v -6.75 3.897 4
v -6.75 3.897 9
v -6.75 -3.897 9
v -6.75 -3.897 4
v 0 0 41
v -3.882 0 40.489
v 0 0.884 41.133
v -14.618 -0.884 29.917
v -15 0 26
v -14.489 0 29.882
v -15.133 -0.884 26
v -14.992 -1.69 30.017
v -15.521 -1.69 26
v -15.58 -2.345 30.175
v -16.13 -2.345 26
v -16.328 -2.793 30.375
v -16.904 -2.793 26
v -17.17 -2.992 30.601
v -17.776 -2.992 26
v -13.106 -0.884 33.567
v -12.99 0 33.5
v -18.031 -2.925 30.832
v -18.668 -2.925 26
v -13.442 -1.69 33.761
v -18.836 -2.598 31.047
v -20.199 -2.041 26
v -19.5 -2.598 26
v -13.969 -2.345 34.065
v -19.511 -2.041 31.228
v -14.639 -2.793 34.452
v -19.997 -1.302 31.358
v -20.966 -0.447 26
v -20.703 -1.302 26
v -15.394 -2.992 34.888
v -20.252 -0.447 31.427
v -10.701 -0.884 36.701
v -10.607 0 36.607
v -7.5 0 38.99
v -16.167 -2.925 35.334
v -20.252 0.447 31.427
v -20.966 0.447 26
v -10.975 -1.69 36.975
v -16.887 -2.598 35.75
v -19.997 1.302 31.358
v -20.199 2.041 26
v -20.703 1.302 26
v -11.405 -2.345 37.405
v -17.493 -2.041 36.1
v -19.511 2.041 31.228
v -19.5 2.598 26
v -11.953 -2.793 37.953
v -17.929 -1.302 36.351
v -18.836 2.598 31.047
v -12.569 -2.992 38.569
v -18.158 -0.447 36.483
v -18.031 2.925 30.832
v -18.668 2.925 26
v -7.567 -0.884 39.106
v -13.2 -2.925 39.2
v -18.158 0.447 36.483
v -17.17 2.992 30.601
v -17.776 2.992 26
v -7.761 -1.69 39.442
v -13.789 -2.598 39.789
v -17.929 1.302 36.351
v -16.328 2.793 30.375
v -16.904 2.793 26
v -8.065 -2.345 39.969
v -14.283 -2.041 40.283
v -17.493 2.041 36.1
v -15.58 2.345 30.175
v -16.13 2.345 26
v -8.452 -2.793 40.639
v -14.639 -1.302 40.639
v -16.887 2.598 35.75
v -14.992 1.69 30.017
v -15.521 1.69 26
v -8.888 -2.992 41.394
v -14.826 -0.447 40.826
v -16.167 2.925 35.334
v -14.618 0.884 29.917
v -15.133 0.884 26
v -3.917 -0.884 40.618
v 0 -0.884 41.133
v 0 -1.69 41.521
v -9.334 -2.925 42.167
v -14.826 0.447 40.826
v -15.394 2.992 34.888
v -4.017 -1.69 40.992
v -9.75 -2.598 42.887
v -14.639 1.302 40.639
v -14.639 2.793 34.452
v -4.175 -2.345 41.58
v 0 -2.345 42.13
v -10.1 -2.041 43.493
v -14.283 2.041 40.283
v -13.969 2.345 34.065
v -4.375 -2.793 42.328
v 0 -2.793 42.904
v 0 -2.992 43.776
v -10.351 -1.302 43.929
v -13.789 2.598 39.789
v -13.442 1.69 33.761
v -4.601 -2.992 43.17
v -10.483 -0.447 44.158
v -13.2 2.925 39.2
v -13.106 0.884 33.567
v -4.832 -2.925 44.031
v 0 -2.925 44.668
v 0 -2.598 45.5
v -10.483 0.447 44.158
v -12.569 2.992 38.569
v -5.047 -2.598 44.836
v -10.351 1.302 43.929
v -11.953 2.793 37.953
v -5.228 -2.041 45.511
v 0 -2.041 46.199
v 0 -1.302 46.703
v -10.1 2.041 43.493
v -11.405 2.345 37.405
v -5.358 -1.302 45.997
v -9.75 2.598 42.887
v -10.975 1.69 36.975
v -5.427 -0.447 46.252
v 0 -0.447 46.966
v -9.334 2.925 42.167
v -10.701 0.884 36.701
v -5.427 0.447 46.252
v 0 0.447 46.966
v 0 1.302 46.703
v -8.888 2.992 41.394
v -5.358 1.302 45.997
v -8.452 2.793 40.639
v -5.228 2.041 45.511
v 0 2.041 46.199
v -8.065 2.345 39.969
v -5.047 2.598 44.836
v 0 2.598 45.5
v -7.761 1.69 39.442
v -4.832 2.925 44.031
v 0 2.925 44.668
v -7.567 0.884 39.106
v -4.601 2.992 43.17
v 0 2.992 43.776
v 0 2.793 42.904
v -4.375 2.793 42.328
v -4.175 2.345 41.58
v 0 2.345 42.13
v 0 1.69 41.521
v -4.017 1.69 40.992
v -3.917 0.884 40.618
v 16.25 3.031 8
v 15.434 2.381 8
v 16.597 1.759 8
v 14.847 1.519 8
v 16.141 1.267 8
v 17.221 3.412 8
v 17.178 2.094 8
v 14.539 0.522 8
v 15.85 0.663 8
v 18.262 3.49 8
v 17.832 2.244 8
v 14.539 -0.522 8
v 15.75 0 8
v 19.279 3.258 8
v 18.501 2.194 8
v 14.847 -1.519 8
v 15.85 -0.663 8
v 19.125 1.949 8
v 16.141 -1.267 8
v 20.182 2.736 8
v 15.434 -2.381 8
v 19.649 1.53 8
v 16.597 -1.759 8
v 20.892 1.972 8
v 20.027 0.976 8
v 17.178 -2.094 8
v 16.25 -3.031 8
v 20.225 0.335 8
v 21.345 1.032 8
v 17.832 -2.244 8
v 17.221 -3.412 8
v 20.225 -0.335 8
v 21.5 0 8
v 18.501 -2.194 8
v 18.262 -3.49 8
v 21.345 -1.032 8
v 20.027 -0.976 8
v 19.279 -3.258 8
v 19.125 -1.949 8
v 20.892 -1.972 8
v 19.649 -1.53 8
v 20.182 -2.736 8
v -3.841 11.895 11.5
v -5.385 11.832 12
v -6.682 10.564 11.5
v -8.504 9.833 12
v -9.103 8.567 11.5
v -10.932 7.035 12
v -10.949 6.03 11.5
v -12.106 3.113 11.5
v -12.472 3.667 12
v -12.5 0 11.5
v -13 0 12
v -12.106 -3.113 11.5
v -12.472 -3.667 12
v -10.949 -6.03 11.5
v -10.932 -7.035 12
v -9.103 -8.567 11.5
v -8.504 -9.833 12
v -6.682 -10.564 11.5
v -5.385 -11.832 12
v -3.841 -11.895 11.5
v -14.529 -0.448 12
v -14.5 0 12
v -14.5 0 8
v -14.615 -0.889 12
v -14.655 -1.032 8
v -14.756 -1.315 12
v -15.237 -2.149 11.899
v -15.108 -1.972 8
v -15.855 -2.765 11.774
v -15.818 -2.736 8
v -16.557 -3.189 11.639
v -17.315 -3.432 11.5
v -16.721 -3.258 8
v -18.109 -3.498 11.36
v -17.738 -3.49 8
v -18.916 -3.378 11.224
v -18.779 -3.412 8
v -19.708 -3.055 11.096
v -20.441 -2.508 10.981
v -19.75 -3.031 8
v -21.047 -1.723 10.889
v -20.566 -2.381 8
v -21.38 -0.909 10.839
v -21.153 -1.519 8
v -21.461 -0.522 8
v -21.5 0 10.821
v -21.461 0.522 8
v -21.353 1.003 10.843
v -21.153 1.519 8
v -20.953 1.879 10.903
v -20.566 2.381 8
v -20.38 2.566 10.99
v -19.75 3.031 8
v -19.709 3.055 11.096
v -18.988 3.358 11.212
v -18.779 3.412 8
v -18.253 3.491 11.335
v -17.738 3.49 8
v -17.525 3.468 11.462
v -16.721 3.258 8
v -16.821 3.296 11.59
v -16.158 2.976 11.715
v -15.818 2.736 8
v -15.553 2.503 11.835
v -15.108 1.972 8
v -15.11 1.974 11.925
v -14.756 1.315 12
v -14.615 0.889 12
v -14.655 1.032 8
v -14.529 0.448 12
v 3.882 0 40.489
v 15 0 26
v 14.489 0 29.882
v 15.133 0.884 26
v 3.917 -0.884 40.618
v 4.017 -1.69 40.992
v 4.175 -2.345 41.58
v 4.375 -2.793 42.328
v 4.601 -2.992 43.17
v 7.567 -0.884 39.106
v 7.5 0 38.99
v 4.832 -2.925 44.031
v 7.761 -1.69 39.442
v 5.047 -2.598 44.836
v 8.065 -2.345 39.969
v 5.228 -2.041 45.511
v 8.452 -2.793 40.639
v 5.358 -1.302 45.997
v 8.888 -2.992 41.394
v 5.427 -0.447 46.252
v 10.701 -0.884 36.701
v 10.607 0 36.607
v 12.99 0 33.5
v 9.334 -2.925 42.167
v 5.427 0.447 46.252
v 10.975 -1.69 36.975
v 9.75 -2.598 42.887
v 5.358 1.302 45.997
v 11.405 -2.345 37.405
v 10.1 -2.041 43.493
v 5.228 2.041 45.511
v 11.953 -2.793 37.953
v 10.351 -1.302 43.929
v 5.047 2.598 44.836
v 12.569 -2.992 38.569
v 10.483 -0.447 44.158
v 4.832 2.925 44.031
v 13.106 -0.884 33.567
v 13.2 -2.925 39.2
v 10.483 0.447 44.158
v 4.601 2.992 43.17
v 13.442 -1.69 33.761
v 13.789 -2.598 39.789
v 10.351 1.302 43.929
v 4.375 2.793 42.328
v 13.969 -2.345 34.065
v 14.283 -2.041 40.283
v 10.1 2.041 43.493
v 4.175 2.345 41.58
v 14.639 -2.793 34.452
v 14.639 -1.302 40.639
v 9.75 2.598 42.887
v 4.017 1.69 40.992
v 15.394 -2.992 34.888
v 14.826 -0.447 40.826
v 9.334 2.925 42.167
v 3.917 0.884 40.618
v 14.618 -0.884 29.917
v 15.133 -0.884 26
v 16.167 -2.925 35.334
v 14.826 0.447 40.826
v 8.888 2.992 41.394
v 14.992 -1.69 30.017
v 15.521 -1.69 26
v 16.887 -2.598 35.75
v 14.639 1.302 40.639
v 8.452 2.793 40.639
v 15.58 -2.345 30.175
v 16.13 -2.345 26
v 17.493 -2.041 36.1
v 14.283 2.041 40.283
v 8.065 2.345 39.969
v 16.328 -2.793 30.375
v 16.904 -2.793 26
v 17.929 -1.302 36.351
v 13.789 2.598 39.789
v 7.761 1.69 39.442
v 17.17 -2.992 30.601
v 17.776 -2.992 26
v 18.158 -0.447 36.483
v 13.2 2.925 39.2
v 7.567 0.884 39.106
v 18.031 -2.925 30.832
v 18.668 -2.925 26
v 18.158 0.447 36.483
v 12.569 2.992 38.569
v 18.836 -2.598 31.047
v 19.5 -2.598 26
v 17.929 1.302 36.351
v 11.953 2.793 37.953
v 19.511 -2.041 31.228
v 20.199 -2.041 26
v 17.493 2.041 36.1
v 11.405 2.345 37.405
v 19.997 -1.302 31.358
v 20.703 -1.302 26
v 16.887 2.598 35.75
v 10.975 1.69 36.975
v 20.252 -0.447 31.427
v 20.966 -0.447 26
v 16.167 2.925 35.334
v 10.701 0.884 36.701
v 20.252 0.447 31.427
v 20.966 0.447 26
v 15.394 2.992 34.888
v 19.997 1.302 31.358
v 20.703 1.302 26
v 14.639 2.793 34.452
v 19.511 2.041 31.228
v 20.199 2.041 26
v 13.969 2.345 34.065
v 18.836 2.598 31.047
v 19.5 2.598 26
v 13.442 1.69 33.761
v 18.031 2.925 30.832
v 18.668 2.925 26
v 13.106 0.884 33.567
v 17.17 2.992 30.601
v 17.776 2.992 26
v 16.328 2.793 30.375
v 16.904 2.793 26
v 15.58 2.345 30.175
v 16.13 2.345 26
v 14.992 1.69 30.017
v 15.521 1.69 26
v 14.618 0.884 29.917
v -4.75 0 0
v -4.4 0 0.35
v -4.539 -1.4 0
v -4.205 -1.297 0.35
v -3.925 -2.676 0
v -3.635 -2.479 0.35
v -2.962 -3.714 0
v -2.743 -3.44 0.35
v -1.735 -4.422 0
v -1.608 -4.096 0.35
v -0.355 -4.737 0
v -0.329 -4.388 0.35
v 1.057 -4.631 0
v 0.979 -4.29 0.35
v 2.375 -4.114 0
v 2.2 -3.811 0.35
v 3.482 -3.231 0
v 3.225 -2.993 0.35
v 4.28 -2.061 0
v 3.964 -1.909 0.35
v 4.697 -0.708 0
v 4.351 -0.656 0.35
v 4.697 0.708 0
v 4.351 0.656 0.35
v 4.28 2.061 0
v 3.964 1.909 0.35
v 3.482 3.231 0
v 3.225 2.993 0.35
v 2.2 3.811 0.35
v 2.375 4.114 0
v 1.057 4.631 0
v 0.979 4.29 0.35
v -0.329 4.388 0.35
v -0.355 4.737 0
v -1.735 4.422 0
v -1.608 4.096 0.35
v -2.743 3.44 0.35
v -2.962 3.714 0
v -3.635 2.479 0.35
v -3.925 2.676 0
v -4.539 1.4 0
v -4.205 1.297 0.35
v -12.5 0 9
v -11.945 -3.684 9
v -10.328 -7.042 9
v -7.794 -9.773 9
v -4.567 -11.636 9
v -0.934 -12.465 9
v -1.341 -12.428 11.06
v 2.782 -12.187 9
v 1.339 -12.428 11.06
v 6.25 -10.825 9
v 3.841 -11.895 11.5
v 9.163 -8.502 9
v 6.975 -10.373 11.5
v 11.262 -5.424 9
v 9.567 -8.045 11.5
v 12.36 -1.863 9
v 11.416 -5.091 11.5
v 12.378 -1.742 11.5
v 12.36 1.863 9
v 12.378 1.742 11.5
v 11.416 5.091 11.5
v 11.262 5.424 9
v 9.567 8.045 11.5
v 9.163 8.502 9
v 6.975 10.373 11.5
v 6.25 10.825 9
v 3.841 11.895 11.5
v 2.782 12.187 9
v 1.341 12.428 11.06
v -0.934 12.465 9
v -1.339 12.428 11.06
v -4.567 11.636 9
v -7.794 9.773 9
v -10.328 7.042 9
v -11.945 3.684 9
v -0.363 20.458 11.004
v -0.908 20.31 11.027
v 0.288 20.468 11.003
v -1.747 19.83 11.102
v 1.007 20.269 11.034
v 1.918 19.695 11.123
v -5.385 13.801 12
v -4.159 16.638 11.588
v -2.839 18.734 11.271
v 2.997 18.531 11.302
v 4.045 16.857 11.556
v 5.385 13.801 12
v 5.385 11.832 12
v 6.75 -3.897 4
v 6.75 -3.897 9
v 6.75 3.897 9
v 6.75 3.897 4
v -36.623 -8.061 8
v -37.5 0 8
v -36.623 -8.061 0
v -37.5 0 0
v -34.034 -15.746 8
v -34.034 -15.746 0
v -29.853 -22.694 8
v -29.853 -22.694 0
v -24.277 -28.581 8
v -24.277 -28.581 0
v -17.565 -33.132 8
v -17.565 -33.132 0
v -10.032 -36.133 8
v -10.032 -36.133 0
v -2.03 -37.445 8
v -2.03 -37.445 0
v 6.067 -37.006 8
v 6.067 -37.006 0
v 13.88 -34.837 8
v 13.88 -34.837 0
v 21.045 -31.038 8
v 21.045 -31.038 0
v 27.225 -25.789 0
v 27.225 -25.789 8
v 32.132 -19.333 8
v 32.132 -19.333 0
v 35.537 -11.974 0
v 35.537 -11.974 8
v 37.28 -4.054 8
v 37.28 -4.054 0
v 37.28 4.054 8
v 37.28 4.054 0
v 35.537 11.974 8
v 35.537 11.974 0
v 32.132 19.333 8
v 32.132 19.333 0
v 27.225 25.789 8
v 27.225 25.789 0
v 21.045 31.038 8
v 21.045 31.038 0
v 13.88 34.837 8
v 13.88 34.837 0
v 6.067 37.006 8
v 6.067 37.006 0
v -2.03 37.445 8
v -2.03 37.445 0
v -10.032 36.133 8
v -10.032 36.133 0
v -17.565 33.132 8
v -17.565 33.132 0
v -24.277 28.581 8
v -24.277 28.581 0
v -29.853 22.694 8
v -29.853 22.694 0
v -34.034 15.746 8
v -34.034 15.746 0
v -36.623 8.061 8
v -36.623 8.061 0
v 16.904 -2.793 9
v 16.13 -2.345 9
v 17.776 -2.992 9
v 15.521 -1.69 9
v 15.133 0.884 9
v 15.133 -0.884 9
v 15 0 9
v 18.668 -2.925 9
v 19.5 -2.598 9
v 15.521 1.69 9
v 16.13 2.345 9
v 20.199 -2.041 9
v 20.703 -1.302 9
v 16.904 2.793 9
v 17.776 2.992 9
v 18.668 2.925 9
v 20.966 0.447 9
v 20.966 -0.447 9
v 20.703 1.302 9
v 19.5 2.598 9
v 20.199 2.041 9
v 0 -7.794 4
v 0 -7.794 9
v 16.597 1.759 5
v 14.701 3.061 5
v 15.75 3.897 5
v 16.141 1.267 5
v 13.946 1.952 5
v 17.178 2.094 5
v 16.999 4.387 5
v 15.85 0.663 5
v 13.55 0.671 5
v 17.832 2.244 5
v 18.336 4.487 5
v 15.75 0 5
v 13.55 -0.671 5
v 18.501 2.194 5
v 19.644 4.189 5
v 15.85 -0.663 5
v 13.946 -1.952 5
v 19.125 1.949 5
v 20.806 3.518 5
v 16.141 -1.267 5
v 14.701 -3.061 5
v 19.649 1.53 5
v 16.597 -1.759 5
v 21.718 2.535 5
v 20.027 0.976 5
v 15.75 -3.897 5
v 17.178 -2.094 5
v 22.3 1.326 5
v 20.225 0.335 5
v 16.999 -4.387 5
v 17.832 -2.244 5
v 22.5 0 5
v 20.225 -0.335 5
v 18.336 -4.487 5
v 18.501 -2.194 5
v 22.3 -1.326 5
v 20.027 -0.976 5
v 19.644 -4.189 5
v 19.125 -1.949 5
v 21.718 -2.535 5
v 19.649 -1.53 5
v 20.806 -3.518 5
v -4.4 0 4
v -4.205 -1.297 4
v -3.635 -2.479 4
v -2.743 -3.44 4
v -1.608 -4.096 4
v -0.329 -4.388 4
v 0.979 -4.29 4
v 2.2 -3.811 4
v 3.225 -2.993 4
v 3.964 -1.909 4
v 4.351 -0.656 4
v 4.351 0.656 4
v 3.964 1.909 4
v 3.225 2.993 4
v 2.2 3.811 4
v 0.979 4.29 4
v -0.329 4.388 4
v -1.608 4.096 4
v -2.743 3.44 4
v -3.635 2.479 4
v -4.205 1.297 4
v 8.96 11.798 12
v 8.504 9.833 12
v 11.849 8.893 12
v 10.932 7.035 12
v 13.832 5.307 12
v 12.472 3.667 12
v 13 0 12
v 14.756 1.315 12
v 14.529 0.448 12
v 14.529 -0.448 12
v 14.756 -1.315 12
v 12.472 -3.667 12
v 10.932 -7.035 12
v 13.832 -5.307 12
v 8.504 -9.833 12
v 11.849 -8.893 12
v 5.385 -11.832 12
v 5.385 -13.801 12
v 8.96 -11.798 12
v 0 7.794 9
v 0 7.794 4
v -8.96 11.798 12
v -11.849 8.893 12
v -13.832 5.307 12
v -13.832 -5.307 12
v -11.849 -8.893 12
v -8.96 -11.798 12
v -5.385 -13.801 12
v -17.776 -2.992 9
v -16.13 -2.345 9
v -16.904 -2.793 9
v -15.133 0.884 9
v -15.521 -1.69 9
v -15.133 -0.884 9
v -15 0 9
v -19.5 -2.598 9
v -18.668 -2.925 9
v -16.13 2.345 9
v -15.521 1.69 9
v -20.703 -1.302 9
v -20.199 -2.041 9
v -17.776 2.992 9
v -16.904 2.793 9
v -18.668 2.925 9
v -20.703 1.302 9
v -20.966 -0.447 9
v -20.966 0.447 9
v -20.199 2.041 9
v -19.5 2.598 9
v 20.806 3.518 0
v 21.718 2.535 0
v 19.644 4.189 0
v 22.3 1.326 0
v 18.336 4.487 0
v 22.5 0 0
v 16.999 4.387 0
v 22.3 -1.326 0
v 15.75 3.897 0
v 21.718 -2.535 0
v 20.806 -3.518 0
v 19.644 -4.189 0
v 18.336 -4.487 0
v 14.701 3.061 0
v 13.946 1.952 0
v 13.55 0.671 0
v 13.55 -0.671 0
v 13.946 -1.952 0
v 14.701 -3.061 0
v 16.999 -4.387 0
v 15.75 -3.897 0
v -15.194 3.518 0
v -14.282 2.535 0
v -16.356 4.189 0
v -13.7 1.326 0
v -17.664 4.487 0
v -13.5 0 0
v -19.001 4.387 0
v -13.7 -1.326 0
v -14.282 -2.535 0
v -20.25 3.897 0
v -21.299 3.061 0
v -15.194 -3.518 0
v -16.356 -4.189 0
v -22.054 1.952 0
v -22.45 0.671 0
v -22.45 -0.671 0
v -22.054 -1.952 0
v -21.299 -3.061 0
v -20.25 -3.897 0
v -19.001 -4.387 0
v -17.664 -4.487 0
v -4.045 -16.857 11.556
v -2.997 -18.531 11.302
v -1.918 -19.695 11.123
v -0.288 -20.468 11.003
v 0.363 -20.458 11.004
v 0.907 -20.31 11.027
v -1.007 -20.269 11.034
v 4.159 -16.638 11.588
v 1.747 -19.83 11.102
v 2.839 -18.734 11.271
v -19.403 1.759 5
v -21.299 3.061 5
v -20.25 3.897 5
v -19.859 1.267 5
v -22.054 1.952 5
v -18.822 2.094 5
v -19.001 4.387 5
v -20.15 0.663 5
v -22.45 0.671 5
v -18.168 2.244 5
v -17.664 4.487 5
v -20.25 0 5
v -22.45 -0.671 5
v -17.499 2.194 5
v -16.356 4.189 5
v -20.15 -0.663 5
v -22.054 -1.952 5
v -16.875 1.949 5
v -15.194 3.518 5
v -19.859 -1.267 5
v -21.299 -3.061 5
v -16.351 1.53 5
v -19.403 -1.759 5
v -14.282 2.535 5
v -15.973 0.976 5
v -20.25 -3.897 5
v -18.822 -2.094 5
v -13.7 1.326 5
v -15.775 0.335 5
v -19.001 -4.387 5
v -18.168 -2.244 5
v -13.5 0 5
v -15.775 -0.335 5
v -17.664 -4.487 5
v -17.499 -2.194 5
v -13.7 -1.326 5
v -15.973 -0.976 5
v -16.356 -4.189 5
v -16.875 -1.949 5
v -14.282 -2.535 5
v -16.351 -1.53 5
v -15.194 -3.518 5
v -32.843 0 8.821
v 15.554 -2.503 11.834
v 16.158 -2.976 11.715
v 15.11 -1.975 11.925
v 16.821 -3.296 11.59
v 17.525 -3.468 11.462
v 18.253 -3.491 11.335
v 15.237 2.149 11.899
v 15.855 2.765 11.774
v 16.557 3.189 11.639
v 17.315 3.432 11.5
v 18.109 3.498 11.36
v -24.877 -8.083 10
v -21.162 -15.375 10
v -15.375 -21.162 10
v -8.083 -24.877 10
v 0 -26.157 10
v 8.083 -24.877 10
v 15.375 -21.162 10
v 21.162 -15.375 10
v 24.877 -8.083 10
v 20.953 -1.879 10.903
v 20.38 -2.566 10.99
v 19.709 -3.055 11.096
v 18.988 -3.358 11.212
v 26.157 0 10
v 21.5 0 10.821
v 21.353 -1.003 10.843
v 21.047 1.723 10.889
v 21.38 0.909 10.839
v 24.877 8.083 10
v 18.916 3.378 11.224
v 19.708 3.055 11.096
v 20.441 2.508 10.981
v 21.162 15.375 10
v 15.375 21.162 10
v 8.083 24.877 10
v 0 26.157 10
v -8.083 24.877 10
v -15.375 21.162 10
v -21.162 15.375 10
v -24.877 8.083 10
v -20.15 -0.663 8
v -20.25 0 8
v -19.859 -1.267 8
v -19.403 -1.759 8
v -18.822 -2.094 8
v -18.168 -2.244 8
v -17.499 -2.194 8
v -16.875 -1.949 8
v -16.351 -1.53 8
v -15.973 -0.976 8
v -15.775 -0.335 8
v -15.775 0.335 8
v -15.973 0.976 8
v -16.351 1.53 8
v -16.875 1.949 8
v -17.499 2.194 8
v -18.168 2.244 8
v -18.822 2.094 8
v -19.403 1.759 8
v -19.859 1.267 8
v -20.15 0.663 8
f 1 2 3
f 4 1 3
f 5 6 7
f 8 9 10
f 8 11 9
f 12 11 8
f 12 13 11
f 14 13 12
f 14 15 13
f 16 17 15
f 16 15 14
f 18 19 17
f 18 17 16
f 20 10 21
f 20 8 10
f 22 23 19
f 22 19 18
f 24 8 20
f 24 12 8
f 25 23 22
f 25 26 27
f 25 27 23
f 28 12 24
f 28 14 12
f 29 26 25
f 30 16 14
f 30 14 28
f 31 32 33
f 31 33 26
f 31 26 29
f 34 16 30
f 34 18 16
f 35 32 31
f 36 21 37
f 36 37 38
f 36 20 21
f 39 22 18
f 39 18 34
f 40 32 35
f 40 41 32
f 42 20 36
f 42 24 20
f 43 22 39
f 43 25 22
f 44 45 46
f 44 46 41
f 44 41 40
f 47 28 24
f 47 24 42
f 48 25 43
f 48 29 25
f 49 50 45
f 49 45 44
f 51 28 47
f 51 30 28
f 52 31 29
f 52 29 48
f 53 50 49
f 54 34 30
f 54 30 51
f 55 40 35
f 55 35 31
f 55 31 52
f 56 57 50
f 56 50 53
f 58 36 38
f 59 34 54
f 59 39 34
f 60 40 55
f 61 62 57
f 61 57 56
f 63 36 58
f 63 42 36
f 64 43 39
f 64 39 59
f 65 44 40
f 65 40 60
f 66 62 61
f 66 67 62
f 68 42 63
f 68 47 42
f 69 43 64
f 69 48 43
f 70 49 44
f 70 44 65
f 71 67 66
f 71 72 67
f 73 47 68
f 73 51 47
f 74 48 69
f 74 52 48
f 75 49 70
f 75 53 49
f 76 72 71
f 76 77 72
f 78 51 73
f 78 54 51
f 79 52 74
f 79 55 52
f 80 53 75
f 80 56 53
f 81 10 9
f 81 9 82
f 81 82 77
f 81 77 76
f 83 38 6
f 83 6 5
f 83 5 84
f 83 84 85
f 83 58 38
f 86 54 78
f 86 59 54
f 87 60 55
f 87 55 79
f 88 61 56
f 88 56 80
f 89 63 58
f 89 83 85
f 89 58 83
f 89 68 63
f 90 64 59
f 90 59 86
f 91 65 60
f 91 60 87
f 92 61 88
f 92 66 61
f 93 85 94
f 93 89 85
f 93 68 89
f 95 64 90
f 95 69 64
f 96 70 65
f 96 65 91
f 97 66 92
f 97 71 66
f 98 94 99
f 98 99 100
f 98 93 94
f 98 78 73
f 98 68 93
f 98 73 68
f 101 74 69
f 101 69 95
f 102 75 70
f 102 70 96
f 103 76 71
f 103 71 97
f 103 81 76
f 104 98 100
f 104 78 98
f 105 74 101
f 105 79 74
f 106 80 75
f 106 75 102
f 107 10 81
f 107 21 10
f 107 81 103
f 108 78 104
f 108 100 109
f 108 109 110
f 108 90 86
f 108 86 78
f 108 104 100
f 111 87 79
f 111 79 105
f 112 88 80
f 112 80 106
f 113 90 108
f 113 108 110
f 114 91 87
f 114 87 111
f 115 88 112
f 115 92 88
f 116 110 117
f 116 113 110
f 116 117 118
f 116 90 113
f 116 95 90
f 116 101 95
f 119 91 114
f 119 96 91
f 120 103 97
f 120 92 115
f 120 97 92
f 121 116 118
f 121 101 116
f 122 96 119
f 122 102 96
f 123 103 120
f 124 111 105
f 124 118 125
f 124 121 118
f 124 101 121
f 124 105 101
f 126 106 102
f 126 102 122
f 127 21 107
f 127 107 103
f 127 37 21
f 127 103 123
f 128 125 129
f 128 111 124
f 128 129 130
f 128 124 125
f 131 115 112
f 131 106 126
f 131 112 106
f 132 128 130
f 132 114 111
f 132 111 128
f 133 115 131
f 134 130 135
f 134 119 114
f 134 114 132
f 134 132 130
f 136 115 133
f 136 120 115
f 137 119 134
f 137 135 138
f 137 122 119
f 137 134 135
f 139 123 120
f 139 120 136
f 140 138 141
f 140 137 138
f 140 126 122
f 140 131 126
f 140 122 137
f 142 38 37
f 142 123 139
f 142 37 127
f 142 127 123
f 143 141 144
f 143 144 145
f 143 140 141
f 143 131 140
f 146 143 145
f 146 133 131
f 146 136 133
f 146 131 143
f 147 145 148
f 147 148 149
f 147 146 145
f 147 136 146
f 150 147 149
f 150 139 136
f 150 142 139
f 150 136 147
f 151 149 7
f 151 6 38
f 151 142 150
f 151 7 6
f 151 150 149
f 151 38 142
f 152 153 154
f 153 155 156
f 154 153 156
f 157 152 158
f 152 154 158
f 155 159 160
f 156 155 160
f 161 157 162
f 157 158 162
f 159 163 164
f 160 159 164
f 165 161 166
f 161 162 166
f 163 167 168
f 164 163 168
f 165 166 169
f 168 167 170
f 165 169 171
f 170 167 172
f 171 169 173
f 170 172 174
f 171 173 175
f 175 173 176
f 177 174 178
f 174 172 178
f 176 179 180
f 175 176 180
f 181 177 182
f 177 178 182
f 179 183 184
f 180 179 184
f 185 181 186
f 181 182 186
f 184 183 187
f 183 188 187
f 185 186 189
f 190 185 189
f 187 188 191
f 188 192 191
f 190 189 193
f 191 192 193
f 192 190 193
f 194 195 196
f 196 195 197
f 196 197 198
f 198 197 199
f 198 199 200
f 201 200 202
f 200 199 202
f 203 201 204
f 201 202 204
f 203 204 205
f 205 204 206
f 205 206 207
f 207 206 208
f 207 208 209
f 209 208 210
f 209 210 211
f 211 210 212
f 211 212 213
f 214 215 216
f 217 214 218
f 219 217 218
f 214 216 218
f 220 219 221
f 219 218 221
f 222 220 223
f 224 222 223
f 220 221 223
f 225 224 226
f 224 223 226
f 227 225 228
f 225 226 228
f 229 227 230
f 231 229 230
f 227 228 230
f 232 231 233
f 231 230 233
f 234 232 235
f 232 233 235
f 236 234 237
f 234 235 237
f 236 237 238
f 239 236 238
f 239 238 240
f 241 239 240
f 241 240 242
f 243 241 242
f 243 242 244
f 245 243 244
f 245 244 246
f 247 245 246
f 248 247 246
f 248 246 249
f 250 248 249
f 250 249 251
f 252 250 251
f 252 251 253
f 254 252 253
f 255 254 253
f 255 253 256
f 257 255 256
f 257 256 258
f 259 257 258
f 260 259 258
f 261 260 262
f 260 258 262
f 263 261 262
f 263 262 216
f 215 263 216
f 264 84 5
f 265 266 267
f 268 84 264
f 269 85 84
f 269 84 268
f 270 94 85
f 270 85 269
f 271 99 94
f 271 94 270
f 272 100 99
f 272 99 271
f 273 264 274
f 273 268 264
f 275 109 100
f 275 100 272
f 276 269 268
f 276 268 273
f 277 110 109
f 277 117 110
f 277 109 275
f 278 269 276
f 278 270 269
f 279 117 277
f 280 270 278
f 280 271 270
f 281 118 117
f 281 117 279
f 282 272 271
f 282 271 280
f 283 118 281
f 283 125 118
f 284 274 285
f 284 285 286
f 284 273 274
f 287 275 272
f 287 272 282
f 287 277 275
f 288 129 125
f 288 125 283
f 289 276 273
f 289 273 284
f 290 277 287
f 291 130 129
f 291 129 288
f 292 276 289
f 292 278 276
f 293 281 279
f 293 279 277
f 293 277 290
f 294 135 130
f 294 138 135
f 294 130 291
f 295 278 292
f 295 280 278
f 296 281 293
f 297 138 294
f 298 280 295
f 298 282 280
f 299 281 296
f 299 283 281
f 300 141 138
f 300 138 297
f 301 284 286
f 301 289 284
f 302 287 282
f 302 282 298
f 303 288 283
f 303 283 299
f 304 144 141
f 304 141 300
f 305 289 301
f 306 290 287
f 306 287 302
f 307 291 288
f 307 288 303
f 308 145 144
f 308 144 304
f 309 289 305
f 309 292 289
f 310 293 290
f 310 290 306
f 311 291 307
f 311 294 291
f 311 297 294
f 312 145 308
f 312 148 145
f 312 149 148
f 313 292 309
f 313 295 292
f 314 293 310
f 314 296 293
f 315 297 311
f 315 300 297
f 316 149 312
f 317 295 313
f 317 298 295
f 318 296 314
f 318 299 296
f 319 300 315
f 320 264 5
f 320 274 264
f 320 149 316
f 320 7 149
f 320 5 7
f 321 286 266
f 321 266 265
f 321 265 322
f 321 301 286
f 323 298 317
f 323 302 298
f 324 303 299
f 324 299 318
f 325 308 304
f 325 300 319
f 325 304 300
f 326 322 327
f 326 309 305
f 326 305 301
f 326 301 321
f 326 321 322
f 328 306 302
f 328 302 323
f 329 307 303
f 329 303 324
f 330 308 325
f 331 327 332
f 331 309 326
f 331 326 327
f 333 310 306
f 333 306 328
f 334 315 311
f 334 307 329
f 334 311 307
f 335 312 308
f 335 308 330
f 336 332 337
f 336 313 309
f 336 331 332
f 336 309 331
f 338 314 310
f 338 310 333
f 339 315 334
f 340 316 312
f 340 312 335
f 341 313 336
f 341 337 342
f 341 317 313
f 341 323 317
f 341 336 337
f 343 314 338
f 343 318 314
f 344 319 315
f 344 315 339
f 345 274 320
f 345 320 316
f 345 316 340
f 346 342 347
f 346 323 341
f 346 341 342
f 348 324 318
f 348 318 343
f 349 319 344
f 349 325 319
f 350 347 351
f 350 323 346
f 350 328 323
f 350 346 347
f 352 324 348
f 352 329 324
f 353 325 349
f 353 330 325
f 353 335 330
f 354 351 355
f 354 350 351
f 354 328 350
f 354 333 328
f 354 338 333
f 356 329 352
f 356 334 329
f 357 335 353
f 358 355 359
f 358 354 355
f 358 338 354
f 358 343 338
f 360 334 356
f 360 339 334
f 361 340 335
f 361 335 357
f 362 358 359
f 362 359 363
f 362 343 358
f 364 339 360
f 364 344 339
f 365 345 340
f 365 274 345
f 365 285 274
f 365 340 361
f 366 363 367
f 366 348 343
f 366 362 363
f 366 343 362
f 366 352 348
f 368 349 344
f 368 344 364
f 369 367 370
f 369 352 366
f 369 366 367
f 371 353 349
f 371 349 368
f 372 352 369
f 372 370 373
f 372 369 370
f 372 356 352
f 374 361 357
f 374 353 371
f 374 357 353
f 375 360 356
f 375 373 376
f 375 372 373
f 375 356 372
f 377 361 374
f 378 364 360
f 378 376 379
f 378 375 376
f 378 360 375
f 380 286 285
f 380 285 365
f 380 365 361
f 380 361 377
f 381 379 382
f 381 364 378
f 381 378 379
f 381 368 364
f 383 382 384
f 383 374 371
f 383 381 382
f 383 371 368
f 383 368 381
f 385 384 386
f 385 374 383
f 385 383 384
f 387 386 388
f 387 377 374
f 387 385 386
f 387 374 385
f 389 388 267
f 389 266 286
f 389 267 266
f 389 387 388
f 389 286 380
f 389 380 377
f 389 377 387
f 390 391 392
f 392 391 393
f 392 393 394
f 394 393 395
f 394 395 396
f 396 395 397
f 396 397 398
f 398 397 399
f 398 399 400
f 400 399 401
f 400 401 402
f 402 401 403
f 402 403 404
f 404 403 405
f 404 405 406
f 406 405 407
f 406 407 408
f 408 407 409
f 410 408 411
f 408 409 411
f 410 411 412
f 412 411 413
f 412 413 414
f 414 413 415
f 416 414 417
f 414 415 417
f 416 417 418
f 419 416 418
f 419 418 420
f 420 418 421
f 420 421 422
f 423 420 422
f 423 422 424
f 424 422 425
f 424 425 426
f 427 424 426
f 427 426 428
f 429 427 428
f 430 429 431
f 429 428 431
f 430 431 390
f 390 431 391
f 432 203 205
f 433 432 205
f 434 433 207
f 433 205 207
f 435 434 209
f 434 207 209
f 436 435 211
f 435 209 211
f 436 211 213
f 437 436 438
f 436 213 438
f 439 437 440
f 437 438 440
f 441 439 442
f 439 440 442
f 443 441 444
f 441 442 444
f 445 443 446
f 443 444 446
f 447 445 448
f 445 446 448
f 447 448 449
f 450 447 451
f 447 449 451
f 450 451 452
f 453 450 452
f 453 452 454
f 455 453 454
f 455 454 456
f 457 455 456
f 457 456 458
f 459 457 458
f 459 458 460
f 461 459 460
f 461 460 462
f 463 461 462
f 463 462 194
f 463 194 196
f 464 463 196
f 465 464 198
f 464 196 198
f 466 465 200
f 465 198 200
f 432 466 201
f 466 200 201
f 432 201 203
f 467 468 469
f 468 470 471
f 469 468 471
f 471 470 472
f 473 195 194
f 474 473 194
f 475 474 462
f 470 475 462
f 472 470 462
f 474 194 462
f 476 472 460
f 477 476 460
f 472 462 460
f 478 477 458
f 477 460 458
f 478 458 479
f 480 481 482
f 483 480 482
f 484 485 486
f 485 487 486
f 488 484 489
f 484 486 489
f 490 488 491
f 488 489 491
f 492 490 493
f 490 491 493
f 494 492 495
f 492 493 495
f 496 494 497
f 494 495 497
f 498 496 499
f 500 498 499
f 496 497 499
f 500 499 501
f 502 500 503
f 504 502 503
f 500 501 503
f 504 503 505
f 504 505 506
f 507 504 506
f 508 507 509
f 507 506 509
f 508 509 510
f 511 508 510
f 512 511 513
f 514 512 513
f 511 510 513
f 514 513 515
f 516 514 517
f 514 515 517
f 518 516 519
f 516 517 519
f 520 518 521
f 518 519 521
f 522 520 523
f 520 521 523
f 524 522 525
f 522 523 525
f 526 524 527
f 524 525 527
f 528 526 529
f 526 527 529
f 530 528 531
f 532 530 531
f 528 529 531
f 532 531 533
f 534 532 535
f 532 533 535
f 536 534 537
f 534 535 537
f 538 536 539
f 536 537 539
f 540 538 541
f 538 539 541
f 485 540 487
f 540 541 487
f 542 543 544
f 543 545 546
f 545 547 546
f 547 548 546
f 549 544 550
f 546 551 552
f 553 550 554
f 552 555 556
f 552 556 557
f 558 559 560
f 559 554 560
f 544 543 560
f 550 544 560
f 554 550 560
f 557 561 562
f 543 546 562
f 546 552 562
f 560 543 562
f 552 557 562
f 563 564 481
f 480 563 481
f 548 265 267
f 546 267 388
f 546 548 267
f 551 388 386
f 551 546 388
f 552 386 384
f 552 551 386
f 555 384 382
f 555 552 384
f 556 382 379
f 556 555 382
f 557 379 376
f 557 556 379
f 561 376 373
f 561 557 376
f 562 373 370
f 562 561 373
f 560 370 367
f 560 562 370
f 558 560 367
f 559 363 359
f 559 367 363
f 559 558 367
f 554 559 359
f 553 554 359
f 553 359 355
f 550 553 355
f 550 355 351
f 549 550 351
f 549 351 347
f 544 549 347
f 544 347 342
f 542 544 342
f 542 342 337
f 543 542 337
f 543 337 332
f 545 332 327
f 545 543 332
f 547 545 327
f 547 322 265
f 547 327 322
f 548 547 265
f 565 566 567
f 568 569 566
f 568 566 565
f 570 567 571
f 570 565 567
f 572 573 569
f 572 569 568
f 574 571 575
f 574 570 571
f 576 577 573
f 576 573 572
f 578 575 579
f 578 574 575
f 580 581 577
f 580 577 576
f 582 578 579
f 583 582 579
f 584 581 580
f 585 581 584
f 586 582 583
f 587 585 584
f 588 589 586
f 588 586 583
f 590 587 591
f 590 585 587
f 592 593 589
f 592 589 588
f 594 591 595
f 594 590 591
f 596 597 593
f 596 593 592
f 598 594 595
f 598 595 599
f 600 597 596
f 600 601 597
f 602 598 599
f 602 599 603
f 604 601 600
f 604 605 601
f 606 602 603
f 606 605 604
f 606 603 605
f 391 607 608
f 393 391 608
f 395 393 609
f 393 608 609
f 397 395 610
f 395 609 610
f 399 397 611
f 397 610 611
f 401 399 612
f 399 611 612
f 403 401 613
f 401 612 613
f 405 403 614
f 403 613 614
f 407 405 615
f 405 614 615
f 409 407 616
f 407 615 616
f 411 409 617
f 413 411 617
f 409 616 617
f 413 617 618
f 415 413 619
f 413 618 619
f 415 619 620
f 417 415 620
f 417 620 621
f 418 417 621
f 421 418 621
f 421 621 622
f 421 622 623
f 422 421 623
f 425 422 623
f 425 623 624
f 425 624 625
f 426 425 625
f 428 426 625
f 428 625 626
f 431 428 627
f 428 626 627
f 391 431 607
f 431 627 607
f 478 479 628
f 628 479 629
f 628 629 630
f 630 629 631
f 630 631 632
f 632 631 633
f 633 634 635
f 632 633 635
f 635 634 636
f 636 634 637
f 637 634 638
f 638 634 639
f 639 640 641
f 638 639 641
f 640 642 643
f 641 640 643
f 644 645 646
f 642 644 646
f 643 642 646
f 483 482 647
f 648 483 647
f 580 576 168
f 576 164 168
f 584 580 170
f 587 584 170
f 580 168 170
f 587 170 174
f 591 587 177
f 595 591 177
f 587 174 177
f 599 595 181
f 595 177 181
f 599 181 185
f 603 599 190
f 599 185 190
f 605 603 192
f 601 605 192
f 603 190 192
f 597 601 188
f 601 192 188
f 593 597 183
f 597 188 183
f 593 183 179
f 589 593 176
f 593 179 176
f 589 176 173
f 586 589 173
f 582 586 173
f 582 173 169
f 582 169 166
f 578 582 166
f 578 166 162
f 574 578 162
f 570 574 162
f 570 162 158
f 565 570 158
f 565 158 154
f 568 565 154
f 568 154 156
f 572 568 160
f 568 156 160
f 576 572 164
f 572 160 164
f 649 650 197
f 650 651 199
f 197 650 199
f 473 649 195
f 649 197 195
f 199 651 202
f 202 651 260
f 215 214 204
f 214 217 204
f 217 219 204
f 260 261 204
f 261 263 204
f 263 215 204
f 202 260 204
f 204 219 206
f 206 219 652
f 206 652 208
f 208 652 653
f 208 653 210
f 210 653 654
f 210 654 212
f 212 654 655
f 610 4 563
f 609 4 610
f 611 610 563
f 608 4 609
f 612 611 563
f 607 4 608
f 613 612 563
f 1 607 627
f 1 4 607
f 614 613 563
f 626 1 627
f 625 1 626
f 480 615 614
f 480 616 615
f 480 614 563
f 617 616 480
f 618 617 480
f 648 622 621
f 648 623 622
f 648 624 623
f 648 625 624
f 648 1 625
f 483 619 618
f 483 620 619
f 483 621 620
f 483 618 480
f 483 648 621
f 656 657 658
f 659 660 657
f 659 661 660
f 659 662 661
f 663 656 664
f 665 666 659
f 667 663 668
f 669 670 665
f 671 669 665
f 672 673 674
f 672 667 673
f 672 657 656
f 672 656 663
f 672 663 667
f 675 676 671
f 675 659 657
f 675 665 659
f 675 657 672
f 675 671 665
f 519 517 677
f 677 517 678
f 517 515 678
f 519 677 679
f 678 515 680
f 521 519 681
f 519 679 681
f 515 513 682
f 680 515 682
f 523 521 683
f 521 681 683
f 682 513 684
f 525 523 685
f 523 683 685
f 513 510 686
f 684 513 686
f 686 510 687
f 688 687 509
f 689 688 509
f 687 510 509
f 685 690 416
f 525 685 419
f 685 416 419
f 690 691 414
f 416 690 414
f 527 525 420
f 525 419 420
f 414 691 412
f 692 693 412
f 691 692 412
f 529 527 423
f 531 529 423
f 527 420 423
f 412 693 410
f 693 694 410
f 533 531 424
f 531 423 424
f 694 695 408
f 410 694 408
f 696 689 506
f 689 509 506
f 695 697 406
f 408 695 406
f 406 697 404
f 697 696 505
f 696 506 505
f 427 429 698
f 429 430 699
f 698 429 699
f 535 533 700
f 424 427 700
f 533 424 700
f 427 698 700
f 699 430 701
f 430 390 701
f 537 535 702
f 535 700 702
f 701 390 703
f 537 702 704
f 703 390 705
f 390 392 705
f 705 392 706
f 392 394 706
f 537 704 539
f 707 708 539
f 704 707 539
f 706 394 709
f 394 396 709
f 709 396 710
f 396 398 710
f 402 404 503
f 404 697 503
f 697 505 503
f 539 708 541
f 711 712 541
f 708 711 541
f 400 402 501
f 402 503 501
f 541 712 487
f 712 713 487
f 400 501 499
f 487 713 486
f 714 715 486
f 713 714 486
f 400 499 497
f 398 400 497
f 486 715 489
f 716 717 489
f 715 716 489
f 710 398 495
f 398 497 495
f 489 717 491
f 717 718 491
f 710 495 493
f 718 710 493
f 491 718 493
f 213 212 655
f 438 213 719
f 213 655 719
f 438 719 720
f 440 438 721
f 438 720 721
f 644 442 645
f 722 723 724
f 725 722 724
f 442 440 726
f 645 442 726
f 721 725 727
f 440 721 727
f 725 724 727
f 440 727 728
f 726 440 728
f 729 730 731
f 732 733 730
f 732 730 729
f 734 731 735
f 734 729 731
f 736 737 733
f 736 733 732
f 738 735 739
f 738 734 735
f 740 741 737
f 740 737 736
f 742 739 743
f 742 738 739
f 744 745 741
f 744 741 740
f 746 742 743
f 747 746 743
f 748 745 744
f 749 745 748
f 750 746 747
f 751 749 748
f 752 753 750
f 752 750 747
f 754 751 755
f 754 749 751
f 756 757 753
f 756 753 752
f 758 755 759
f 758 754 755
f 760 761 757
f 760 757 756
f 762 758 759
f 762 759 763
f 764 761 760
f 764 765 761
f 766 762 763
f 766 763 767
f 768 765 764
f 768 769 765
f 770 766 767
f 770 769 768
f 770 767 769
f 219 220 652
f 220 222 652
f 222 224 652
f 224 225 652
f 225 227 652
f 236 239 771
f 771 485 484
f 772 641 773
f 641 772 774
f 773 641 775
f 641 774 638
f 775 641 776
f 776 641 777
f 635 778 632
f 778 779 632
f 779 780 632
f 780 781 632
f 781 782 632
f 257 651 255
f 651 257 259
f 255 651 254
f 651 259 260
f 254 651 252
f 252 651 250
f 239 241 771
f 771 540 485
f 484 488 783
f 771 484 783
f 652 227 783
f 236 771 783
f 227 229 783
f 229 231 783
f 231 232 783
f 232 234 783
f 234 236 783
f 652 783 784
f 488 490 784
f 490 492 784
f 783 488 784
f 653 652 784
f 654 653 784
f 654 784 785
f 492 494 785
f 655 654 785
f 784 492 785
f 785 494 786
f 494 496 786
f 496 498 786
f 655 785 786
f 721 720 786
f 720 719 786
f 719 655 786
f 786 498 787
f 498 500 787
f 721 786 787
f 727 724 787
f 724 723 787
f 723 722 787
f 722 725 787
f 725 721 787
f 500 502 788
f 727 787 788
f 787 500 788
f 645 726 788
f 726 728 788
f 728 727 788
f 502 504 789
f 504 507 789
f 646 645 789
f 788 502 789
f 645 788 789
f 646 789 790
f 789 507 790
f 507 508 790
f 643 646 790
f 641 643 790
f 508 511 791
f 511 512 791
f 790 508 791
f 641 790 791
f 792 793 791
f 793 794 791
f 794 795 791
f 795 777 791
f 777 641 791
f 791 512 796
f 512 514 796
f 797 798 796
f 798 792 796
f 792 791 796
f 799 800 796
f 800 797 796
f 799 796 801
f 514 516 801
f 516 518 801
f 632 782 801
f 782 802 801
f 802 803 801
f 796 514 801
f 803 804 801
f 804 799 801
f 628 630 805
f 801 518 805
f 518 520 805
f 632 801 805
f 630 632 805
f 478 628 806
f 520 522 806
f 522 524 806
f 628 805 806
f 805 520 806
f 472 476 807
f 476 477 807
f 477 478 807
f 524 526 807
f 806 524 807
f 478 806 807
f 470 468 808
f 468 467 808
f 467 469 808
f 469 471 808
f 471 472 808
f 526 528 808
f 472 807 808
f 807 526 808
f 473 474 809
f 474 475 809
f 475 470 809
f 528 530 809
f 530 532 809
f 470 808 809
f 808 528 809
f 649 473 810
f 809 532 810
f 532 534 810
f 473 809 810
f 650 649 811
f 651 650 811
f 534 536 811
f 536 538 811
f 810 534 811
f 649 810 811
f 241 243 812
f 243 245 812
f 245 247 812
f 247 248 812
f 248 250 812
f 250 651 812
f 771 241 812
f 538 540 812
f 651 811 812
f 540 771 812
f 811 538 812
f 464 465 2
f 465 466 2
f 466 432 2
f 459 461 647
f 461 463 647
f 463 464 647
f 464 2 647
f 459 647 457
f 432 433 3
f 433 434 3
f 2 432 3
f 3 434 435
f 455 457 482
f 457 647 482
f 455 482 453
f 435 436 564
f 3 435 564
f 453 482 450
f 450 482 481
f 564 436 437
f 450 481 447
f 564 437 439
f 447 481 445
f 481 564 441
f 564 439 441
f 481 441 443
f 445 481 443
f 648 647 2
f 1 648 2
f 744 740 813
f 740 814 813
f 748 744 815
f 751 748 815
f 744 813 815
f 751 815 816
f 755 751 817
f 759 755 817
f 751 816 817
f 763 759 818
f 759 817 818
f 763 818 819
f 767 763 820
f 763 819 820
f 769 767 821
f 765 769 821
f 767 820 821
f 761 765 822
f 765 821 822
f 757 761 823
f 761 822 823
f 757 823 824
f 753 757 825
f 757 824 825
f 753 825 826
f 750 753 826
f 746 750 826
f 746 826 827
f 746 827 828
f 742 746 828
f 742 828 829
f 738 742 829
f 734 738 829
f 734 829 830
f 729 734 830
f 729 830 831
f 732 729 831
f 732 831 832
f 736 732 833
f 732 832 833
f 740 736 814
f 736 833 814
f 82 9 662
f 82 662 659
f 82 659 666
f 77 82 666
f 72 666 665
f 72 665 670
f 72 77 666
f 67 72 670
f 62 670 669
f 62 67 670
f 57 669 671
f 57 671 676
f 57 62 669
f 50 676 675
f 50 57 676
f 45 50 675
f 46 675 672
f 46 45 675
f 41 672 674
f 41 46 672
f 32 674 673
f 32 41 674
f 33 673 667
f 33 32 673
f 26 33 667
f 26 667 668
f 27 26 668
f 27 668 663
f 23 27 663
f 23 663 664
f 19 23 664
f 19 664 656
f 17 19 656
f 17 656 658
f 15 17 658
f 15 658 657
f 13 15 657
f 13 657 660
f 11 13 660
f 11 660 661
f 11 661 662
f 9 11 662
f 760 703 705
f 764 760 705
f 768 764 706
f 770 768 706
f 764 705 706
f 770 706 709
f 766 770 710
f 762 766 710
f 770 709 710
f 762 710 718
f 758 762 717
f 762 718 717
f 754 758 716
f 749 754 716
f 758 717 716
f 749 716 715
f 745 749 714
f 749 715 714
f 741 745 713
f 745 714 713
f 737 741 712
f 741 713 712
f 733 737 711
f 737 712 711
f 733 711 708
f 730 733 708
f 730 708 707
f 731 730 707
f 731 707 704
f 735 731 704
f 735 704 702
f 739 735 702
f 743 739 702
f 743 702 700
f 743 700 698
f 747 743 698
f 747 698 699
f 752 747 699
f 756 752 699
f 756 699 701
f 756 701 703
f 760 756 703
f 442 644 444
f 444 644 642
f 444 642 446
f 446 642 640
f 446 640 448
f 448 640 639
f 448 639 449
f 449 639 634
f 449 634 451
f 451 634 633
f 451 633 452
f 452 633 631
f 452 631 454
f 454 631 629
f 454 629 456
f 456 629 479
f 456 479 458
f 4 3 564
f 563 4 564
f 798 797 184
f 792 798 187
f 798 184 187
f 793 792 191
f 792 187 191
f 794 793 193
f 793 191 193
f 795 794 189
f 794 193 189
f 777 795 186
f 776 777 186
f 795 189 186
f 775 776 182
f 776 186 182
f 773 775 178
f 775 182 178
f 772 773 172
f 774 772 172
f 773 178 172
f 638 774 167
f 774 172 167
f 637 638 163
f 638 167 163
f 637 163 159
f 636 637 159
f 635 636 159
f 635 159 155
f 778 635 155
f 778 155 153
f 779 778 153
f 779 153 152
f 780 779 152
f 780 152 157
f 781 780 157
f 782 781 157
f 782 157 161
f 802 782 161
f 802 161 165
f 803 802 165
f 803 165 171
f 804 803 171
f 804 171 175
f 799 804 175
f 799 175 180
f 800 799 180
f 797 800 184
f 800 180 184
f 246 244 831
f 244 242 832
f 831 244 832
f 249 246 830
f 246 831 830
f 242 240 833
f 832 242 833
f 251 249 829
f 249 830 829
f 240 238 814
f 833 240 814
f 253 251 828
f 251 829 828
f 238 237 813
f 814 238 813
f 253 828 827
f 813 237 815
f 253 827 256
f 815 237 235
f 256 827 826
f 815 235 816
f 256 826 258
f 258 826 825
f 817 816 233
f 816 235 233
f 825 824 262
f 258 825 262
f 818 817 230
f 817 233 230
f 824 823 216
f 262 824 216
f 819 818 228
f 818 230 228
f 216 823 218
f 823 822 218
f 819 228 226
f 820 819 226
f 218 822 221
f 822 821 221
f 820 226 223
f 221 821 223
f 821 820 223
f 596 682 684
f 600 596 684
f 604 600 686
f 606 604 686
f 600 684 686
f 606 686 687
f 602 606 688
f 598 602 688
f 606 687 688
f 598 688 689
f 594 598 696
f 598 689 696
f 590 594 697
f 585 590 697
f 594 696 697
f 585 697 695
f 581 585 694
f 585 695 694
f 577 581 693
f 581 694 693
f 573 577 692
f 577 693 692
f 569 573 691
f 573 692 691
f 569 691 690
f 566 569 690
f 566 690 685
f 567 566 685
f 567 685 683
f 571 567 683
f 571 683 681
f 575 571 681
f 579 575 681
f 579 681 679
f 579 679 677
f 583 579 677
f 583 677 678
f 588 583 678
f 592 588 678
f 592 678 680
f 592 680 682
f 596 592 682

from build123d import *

# Parameters (mm, degrees)
F2_SIZE         = 0.5
F3_R            = 15
F4_DEPTH        = 50
F8_R            = 3
F12_D           = 7
F12_DEPTH       = 5.5
F12_TIP         = 2.1030121666
F14_D           = 4.5
F14_CBORE_D     = 9
F14_CBORE_DEPTH = 5
F15_D           = 8.8
F15_CSINK_D     = 9.5
F15_CSINK_ANGLE = 90
F17_DEPTH       = 5


# Not quite as in the source:
# - a feature of the source that left no trace in its solid (it failed there, or was rolled back) is left out


with BuildPart() as f1:
    # F0 (on Front) → F1 (revolve)
    with BuildSketch(Plane.XZ):
        Polygon((-37.5, 0), (0, 0), (0, 9), (-12.5, 9), (-12.5, 12), (-14.8148727215, 12), (-37.5, 8), align=None)
    revolve(axis=Axis((0, 0, 21.8192628079), (0, 0, 1)))

    # F2
    f2_edges = [f1.edges().sort_by_distance(p)[0] for p in [
        (12.5, 0, 12),
    ]]
    chamfer(f2_edges, length=F2_SIZE)


with BuildPart() as f4:
    # F3 (on Front) → F4 (new body, symmetric)
    with BuildSketch(Plane.XZ):
        with Locations((0, 26)):
            Circle(F3_R)
    extrude(amount=F4_DEPTH, both=True)


with BuildPart() as f1_1:
    add(f1.part)

    # F5: cut F4
    add(f4.part, mode=Mode.SUBTRACT)

    # F12 (one way)
    with BuildSketch(Plane(origin=(0, 0, 8), x_dir=(1, 0, 0), z_dir=(0, 0, -1))):
        with Locations((-18, 0), (18, 0)):
            Circle(F12_D / 2)
    extrude(amount=-F12_DEPTH, mode=Mode.SUBTRACT)
    with Locations(Plane(origin=(0, 0, 8), x_dir=(1, 0, 0), z_dir=(0, 0, -1))):
        with Locations((-18, 0), (18, 0)):
            with Locations((0, 0, -(F12_DEPTH + F12_TIP / 2))):  # 118° drill point
                Cone(0, F12_D / 2, F12_TIP, mode=Mode.SUBTRACT)

    # F14 (through all)
    with Locations(Plane(origin=(0, 0, 0), x_dir=(1, 0, 0), z_dir=(0, 0, -1))):
        with Locations((-18, 0), (18, 0)):
            CounterBoreHole(F14_D / 2, F14_CBORE_D / 2, F14_CBORE_DEPTH)

    # F15 (through all)
    with Locations(Plane(origin=(0, 0, 0), x_dir=(1, 0, 0), z_dir=(0, 0, -1))):
        with Locations((0, 0)):
            CounterSinkHole(F15_D / 2, F15_CSINK_D / 2, counter_sink_angle=F15_CSINK_ANGLE)

    # F16 (on face) → F17 (cut)
    with BuildSketch(Plane.XY.offset(9)):
        Polygon((6.75, 3.897114317), (0, 7.7942286341), (-6.75, 3.897114317), (-6.75, -3.897114317), (0, -7.7942286341), (6.75, -3.897114317), align=None)
    extrude(amount=-F17_DEPTH, mode=Mode.SUBTRACT)


with BuildPart() as f9:
    # F9: sweep along a path in F6
    with BuildLine(Plane.XZ) as f9_path:
        Line((-18, 9), (-18, 26))
        ThreePointArc((-18, 26), (-12.7279220614, 38.7279220614), (0, 44))
        ThreePointArc((0, 44), (12.7279220614, 38.7279220614), (18, 26))
        Line((18, 26), (18, 9))
    # F8 (on line) → F9 (sweep)
    with BuildSketch(Plane(origin=(0, 0, 9), x_dir=(1, 0, 0), z_dir=(0, 0, -1))):
        with Locations((-18, 0)):
            Circle(F8_R)
    sweep(path=f9_path.line)


solid = Compound([f1_1.part, f9.part])
